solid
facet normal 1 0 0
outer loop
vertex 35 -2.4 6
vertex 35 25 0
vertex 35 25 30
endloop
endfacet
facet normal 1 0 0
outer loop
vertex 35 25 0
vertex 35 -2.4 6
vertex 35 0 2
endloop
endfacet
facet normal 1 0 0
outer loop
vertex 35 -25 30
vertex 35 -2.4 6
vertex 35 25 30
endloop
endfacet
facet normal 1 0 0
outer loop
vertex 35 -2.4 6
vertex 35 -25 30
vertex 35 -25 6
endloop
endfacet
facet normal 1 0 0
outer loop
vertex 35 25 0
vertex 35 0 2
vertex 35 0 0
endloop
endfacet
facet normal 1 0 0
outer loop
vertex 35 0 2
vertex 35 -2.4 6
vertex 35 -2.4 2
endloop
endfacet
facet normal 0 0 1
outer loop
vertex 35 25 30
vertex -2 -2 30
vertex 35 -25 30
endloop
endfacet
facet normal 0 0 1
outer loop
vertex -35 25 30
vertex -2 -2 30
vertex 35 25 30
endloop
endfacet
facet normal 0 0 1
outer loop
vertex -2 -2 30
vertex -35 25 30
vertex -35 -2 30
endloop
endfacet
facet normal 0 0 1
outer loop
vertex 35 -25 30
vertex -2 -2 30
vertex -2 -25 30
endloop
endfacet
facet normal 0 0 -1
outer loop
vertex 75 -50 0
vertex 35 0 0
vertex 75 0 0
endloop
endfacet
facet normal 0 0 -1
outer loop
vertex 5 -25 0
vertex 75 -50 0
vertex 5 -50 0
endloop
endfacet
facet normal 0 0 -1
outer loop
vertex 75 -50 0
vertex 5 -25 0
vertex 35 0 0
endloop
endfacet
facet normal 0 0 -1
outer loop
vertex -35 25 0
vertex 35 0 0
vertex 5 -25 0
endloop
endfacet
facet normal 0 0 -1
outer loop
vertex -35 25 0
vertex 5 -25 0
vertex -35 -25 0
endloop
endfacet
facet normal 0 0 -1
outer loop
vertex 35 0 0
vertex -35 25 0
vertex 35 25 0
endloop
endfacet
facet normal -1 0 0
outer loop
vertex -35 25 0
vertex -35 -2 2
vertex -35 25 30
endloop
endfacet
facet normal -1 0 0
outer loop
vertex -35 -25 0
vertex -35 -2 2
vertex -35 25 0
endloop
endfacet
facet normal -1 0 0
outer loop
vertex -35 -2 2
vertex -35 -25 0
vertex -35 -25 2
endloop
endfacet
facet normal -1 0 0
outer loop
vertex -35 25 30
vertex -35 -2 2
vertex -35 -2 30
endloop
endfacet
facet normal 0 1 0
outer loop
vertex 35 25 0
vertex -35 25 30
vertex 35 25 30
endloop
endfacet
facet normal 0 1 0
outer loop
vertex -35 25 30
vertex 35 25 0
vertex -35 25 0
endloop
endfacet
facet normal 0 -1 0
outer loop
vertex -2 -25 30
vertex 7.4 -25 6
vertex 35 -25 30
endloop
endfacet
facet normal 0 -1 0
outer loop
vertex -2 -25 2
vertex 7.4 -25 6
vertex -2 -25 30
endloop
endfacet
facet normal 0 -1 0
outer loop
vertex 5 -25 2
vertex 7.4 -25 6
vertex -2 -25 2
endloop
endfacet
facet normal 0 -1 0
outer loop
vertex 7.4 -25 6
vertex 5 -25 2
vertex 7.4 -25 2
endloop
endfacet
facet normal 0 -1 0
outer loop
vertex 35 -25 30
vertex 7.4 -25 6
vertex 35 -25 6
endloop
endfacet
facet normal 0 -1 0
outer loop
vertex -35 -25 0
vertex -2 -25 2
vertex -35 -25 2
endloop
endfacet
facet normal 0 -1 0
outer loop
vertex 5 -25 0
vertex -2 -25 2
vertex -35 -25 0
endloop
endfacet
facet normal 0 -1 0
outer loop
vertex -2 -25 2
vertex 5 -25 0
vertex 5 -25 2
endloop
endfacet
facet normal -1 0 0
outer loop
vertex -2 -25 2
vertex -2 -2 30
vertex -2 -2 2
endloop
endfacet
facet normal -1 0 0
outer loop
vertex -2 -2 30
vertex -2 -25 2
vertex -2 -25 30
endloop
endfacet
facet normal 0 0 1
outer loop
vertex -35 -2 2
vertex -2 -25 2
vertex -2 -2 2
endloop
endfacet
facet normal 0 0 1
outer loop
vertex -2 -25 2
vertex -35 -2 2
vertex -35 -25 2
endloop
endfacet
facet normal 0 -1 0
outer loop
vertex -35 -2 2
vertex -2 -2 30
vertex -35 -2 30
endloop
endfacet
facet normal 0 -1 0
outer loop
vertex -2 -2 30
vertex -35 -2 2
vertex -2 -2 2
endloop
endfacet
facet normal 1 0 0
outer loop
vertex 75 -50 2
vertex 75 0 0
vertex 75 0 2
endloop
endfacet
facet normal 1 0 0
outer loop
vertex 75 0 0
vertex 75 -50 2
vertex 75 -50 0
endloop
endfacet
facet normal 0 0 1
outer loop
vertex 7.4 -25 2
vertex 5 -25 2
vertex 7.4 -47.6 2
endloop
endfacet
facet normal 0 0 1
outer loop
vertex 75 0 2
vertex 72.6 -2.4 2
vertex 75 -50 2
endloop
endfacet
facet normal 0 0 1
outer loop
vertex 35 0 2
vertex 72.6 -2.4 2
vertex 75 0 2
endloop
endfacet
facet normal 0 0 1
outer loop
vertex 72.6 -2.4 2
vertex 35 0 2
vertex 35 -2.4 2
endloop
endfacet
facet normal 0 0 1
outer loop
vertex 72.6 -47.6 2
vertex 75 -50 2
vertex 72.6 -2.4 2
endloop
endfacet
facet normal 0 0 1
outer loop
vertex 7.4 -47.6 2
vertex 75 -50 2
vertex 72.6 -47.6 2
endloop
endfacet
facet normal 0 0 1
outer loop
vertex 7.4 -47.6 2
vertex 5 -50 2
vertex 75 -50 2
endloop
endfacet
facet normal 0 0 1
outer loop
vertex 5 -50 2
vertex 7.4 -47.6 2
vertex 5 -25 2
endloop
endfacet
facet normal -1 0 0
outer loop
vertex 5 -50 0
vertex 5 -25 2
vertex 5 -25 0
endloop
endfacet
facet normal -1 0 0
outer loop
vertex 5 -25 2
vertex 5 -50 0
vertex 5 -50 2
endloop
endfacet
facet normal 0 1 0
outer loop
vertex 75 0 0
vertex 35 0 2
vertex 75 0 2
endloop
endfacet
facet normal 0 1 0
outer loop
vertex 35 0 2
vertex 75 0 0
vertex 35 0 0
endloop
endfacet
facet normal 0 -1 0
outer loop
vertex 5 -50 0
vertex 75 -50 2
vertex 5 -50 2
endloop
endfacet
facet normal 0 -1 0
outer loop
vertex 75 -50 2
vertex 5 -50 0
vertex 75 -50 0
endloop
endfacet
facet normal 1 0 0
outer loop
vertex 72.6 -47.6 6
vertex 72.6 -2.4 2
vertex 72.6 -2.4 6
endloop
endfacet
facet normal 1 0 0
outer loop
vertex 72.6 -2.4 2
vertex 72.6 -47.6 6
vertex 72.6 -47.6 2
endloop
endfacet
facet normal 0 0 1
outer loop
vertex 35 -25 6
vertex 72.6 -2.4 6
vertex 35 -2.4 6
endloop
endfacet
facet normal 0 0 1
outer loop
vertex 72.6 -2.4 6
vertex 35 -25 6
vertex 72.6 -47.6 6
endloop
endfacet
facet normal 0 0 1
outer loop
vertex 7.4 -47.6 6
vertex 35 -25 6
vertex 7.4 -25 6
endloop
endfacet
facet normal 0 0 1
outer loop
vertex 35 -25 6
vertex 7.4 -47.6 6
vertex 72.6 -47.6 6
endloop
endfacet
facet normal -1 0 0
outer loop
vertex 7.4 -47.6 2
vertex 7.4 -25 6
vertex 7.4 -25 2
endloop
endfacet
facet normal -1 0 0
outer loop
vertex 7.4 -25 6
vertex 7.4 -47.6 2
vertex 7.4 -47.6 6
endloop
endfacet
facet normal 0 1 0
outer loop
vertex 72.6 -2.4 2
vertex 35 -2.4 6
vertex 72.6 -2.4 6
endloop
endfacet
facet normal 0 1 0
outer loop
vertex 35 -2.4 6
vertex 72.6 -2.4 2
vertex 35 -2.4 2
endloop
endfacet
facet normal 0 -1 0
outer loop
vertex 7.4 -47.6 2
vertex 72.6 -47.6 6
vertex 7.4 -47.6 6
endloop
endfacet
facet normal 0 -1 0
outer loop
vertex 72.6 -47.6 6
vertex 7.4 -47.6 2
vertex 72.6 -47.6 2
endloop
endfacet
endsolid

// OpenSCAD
// Two-part enclosure for a small electronics board (e.g. Arduino-based temperature logger)
// Print orientation: both parts flat on the bed (XY plane), building up in +Z
// Print side by along X with a 10 mm gap between them

// ---------------- Parameters ----------------
box_x            = 70;    // box outer size in X (mm)
box_y            = 50;    // box outer size in Y (mm)
box_z            = 30;    // box outer size in Z (mm)
box_wall         = 2;     // box wall thickness (mm)
box_floor        = 2;     // box floor thickness (mm)

lid_x            = 70;    // lid plate size in X (mm)
lid_y            = 50;    // lid plate size in Y (mm)
lid_wall         = 1.5;   // lid lip wall thickness (mm)
lid_lip_height   = 4;     // lid lip height above plate (mm)
lip_outer_x      = 65.6;  // outer size of lip in X (mm)
lip_outer_y      = 45.6;  // outer size of lip in Y (mm)
lip_clearance    = 0.2;   // clearance between lip inner/outer edges (mm)

gap              = 10;    // gap between box and lid on the bed (mm)

eps              = 0.5;   // overcut for clean boolean differences (mm)

// Derived values
box_inner_x      = box_x - 2*box_wall;   // 66 mm
box_inner_y      = box_y - 2*box_wall;   // 46 mm
box_open_top_z   = box_z - box_wall;     // top of walls (open)
lip_inner_x      = lip_outer_x - 2*lip_clearance; // 65.2 mm
lip_inner_y      = lip_outer_y - 2*lip_clearance; // 45.2 mm
plate_t          = 2;                    // lid plate thickness (mm)

// ---------------- Model ----------------
union() {
    // Part 1: Box, open top
    translate([-box_x/2, -box_y/2, 0])
        difference() {
            cube([box_x, box_y, box_open_top_z + box_wall]);
            translate([-box_inner_x/2, -box_inner_y/2, box_floor])
                cube([box_inner_x, box_inner_y, box_open_top_z]);
        }

    // Part 2: Lid, printed upside down (lip on top, plate below)
    translate([(box_x + gap)/2, -lid_y/2, 0])
        union() {
            // Base plate
            translate([-lid_x/2, -lid_y/2, 0])
                cube([lid_x, lid_y, plate_t]);

            // Rectangular lip on top of the plate
            translate([-lip_inner_x/2, -lip_inner_y/2, plate_t])
                cube([lip_inner_x, lip_inner_y, lid_lip_height]);
        }
}
